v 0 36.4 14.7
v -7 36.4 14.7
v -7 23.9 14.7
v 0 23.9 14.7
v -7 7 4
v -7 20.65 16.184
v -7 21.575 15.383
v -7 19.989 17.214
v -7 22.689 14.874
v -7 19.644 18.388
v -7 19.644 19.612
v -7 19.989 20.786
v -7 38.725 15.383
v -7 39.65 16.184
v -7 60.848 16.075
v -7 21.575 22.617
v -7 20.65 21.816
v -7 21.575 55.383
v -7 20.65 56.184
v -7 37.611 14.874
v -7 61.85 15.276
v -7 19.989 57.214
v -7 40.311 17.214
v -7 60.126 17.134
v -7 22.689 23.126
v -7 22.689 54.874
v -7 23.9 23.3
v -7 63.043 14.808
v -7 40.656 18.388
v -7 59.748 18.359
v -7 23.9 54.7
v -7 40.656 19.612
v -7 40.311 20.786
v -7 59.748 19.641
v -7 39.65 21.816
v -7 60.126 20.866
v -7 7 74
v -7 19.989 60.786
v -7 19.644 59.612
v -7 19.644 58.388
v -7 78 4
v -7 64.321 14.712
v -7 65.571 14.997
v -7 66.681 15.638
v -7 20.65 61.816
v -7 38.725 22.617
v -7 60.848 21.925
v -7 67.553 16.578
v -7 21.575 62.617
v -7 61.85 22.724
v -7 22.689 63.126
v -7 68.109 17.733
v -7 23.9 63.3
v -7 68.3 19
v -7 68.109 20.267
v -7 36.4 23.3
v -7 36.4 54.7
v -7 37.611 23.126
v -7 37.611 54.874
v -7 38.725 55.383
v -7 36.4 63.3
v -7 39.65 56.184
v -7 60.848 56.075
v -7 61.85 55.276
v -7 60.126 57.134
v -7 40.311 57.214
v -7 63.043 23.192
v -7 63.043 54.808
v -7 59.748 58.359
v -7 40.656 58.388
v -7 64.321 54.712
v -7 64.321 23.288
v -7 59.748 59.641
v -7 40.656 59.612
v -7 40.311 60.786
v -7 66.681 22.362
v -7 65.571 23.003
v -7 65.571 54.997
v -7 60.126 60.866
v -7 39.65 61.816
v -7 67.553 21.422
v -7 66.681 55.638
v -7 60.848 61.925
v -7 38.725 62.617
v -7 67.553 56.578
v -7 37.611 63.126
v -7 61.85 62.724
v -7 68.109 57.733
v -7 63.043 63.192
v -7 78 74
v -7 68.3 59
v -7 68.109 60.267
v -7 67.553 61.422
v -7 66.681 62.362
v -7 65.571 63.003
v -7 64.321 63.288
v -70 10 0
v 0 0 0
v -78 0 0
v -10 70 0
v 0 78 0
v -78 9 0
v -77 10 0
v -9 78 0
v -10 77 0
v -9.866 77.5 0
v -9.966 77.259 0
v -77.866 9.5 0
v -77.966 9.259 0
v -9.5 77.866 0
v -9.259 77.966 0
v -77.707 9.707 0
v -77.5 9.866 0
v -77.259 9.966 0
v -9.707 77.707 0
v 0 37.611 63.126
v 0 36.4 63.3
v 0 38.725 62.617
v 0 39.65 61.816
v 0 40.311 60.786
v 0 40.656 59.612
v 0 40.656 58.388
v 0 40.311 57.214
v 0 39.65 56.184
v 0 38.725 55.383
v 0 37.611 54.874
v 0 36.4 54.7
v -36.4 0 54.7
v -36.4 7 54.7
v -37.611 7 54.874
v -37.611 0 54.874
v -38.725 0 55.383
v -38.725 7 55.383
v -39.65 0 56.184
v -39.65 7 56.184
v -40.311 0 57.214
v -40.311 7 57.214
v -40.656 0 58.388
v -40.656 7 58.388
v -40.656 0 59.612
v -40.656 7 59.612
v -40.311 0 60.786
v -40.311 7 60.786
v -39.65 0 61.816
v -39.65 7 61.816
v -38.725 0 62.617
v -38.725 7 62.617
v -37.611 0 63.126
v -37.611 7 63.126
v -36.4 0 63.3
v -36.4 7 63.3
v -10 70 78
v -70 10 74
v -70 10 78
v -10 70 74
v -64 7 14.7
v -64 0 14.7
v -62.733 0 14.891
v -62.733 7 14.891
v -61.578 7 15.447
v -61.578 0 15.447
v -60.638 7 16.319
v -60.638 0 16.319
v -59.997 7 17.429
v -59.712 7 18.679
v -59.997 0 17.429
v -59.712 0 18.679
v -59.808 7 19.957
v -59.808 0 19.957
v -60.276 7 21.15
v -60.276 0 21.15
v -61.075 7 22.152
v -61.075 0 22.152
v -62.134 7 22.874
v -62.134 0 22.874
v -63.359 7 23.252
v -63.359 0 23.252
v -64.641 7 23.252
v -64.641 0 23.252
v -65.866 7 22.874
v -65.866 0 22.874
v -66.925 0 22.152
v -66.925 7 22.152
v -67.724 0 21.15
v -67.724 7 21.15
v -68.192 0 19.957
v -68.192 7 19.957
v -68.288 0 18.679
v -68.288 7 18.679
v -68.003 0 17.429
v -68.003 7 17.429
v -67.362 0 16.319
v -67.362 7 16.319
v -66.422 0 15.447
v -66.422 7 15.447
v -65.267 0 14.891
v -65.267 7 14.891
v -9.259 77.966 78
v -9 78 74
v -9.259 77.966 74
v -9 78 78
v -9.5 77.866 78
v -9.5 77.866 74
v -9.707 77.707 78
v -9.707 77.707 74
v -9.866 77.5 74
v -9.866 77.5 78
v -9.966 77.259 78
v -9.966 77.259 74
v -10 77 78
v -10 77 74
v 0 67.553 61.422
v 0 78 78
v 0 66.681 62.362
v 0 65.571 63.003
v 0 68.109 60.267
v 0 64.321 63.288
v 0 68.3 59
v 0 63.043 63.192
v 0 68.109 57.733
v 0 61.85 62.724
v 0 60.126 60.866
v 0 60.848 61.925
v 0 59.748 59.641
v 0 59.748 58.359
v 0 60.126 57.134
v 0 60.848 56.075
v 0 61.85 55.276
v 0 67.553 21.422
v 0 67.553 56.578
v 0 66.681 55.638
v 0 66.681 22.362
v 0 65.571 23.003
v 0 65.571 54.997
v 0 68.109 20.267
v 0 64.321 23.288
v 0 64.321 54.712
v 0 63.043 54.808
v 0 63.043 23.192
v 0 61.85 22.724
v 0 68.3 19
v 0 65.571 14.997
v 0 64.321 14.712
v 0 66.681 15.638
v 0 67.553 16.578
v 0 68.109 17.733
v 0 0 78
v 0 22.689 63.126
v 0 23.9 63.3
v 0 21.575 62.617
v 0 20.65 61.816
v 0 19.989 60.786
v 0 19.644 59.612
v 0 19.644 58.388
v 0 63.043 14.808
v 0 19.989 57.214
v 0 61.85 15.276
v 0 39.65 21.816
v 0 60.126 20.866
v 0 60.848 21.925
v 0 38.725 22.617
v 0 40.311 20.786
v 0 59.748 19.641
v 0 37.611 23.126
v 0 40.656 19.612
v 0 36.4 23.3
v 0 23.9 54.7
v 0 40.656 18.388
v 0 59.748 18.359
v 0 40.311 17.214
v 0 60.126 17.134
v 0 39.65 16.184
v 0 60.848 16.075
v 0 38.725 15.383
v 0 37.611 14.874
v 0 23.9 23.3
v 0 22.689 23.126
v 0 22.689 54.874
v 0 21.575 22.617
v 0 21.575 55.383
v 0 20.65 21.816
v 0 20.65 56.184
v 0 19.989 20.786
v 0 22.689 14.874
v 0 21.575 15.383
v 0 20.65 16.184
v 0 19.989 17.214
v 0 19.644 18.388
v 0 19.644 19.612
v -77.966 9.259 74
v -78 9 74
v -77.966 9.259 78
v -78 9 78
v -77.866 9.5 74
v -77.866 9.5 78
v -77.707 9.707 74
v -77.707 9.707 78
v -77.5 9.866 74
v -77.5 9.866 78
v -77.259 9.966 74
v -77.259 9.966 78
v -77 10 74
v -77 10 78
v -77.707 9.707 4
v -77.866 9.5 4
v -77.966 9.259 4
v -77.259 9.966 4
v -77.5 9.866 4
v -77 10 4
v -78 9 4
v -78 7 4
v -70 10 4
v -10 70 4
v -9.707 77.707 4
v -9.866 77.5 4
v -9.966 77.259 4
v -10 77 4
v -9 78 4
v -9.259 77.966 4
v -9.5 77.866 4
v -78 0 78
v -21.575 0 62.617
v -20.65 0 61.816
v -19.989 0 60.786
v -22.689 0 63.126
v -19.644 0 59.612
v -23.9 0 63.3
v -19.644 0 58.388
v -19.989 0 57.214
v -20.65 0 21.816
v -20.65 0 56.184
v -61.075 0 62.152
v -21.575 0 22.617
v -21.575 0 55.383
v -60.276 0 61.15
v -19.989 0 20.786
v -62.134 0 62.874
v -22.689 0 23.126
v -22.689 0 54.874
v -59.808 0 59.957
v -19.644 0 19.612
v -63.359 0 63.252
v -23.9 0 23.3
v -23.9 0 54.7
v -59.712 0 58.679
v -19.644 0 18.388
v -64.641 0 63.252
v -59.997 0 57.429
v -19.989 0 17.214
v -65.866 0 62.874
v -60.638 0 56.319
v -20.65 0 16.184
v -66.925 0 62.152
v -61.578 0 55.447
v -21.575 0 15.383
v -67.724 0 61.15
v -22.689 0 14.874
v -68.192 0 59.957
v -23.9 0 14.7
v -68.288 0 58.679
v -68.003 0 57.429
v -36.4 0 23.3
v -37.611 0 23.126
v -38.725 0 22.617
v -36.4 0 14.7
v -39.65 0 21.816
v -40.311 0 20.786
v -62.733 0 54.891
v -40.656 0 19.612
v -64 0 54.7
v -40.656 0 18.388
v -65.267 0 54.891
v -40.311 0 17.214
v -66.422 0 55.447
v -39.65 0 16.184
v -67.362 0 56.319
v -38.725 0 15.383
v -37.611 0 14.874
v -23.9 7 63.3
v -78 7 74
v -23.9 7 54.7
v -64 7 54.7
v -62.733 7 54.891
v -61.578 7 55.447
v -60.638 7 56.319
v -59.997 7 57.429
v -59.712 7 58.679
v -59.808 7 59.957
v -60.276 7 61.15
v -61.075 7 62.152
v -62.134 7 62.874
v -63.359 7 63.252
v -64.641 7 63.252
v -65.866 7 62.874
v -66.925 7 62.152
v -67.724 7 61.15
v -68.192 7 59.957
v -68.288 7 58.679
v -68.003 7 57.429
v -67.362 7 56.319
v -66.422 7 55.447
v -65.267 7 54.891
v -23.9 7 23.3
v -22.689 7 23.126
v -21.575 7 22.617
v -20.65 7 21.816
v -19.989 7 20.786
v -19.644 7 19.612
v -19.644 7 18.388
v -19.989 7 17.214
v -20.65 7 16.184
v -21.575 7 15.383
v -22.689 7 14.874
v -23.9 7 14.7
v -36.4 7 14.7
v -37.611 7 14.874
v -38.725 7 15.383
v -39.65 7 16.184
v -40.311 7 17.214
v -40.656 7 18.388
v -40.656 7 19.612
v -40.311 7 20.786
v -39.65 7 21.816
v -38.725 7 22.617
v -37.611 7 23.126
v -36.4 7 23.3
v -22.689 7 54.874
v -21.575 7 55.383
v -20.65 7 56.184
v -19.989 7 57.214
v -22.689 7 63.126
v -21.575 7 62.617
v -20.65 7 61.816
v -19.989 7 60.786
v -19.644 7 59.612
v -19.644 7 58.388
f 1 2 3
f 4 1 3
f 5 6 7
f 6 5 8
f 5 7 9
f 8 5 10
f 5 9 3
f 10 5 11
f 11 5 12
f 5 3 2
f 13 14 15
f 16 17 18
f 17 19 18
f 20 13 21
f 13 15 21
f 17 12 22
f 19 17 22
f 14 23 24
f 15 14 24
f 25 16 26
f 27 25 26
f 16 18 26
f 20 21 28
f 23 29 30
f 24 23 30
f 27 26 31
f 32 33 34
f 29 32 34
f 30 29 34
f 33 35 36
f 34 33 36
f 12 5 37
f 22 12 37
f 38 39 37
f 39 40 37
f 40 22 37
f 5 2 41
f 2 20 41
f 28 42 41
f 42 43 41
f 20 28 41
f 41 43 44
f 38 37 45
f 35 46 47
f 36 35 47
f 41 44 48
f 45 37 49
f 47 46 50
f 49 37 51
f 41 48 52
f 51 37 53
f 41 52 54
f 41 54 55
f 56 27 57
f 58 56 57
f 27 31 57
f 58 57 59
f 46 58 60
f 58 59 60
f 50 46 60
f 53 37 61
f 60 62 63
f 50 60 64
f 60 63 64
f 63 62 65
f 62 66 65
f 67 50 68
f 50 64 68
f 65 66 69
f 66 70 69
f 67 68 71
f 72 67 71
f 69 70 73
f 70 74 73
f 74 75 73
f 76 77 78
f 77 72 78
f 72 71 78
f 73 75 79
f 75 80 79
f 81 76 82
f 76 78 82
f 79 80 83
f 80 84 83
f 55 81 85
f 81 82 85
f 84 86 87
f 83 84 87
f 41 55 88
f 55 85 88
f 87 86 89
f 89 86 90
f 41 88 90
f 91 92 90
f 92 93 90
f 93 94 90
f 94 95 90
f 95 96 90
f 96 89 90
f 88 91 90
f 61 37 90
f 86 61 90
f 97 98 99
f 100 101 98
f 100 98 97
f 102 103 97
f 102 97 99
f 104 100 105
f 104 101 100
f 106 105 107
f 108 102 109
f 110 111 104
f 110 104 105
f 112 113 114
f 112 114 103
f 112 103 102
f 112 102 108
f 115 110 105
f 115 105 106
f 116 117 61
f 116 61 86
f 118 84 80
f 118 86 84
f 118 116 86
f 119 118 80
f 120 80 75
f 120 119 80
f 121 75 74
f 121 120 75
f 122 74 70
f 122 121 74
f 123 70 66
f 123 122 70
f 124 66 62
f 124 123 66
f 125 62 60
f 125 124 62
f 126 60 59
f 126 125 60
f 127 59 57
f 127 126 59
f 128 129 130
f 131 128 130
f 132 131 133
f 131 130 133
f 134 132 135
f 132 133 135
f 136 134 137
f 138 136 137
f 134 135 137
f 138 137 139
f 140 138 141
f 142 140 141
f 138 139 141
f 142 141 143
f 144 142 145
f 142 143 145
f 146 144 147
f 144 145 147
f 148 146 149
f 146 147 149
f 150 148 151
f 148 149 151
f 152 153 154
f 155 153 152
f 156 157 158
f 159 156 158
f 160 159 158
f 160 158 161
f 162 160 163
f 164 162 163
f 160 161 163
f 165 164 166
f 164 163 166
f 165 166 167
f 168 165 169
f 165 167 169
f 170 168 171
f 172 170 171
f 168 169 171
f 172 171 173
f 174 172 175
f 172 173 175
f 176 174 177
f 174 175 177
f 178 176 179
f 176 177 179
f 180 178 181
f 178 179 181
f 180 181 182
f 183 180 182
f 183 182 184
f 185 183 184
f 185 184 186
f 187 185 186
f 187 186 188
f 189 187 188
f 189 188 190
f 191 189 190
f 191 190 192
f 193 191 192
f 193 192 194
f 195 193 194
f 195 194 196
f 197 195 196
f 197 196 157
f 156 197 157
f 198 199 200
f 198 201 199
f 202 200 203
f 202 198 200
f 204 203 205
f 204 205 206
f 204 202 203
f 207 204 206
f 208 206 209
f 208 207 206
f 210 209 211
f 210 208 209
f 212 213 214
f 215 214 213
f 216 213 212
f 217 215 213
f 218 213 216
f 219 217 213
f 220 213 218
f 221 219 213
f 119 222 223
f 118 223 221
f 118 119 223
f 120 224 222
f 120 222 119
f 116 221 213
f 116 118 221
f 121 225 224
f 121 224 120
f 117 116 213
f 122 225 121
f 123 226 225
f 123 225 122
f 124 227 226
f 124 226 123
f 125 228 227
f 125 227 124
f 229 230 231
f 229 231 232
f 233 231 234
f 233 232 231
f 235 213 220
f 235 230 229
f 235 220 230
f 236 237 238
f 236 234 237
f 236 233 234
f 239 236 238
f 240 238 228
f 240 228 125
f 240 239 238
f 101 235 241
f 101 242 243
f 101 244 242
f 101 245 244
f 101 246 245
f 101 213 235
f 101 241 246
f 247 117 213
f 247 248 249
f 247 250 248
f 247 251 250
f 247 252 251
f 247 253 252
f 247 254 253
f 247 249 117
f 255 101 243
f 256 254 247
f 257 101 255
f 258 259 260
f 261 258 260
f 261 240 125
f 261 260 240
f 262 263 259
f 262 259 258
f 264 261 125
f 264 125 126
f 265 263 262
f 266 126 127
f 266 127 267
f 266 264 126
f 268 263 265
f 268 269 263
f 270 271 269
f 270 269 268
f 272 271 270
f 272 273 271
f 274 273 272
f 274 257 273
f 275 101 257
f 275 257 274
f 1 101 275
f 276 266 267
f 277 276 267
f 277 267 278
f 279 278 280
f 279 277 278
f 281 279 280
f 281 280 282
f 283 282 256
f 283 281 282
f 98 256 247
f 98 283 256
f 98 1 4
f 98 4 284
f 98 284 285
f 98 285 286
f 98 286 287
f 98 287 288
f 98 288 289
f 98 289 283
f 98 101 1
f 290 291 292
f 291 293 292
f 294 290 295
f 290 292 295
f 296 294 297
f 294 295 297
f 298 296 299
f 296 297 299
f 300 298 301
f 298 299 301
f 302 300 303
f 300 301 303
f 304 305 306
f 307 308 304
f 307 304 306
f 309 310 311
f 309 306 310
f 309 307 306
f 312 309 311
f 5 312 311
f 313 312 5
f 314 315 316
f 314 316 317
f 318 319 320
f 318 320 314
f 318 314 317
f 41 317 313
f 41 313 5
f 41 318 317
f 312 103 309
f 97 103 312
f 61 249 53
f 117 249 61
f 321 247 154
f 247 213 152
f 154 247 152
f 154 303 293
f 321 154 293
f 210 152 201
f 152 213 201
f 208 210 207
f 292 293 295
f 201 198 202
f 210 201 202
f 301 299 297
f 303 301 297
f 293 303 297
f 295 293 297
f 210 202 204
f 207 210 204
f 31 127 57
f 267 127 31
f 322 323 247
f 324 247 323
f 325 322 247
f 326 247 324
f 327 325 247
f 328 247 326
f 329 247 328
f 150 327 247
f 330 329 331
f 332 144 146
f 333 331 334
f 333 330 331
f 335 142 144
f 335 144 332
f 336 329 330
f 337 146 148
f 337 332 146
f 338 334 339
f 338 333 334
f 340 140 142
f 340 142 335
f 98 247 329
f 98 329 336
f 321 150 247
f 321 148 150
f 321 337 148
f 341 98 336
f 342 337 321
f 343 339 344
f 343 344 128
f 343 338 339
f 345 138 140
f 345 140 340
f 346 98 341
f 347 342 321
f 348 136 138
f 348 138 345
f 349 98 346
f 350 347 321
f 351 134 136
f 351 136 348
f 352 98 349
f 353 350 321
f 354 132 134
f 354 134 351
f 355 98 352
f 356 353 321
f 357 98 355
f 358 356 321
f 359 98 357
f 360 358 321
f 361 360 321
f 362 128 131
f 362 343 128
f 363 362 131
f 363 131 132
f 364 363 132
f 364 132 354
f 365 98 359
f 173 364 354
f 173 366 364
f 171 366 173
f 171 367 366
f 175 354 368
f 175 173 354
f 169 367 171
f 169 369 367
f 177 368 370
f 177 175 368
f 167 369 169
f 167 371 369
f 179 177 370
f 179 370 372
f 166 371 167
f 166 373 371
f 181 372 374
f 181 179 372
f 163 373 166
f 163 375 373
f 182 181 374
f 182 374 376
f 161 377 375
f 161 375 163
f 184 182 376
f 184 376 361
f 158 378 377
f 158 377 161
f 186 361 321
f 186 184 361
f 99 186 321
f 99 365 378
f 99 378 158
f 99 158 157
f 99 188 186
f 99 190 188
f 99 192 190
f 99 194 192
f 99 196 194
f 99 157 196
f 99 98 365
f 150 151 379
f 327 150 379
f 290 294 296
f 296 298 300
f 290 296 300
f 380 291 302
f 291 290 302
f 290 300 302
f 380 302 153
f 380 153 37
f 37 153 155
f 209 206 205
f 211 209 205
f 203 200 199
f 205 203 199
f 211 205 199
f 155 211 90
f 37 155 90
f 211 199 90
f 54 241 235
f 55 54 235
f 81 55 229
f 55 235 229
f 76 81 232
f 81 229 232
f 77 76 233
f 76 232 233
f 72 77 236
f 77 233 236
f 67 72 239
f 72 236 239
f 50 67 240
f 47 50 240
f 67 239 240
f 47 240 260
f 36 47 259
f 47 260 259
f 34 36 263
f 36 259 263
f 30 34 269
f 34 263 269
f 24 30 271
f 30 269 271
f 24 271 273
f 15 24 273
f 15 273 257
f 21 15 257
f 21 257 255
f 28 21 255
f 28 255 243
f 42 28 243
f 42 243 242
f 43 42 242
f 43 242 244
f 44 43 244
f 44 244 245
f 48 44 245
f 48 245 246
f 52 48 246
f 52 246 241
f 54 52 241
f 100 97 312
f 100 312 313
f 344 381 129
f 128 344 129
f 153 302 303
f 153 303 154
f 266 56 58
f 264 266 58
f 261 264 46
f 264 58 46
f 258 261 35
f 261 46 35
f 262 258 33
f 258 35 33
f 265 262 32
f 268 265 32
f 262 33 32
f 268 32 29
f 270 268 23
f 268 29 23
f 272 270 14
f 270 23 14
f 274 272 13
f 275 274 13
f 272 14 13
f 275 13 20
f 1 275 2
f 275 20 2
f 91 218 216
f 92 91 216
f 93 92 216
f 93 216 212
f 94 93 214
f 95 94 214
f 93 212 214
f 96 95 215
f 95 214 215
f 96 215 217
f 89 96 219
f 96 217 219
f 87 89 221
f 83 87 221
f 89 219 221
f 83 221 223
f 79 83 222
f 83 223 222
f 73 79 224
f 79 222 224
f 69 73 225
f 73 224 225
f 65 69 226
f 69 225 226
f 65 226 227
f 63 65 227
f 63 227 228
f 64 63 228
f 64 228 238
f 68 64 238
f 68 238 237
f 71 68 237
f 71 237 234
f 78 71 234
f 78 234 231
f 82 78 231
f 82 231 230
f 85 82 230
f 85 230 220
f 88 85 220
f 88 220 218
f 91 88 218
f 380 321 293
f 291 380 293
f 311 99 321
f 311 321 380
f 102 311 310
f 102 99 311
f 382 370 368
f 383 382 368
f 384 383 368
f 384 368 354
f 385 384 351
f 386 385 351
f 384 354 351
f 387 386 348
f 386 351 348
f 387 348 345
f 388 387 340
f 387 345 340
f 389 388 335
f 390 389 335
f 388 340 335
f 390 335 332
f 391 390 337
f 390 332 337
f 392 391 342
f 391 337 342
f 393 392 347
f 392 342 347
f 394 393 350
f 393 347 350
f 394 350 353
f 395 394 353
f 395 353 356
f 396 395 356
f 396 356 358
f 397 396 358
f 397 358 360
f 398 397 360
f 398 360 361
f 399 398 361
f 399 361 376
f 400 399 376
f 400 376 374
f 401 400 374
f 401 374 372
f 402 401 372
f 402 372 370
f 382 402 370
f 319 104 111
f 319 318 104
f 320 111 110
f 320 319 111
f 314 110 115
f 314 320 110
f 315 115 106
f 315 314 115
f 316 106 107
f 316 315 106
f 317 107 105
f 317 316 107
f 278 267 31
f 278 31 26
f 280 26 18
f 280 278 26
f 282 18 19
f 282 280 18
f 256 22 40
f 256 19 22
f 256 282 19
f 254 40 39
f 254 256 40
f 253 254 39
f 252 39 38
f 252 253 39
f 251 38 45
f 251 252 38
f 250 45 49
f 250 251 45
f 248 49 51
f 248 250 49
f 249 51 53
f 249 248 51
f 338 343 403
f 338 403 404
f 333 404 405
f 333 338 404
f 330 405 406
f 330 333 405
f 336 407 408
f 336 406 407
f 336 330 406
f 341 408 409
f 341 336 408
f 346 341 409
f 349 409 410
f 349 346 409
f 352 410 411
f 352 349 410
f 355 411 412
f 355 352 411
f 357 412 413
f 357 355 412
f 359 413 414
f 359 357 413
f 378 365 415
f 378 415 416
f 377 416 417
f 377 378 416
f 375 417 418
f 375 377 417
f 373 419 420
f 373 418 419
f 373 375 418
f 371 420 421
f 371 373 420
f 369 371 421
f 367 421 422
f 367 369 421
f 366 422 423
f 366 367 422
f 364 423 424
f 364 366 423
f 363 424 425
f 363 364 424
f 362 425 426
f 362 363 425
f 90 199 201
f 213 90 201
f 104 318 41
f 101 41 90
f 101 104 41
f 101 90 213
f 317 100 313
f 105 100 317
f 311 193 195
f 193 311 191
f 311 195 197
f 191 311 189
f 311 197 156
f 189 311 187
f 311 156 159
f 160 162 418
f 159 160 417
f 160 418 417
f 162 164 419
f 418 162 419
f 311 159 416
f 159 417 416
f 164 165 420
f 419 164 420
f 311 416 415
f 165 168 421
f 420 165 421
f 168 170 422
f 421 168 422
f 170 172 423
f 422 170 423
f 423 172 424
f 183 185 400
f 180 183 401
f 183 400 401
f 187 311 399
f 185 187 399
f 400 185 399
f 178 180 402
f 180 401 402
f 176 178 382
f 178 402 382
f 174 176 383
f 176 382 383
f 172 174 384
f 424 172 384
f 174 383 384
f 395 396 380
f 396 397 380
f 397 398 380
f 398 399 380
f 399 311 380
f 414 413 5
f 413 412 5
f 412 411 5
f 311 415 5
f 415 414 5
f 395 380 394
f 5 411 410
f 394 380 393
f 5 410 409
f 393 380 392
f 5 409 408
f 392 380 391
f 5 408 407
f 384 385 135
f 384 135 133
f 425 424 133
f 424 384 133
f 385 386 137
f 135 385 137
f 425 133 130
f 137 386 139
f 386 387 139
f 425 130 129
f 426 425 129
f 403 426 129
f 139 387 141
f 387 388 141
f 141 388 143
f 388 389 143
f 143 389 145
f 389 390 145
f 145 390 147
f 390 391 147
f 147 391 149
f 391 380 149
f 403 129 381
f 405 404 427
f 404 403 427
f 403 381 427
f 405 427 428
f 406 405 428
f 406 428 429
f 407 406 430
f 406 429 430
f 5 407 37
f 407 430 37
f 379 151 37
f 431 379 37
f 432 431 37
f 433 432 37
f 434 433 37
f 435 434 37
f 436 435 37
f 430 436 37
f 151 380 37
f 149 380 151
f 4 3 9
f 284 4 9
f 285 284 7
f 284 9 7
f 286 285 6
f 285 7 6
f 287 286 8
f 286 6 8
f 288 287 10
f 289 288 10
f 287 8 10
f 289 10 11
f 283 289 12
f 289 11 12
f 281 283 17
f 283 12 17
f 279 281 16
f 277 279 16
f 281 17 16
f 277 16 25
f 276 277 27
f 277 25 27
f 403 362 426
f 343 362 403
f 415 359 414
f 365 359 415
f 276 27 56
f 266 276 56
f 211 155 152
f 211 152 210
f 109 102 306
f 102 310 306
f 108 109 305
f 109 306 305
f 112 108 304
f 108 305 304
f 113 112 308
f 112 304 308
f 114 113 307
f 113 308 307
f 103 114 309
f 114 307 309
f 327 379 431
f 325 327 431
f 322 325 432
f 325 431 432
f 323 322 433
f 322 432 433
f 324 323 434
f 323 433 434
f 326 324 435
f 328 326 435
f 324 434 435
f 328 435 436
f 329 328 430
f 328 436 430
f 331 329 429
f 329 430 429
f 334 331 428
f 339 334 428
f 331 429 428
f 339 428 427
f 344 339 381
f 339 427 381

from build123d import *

# Parameters (mm, degrees)
EXTRUDE_1_DEPTH     = 78
SKETCH_2_W          = 76.862745098
SKETCH_2_H          = 79.911669522
CUT_EXTRUDE_1_DEPTH = 35
FILLET_1_R          = 1
SKETCH_3_R          = 4.3
CUT_EXTRUDE_2_DEPTH = 35
SKETCH_4_R          = 4.3
CUT_EXTRUDE_3_DEPTH = 35


with BuildPart() as part:
    # 草图1 → 凸台-拉伸1 (new body)
    with BuildSketch(Plane.XY):
        Polygon((0, 0), (-78, 0), (-78, 10), (-70, 10), (-10, 70), (-10, 78), (0, 78), align=None)
    extrude(amount=EXTRUDE_1_DEPTH)

    # 草图2 → 切除-拉伸1 (cut, symmetric)
    with BuildSketch(Plane.XY.offset(39)):
        with Locations((-45.431372549, 46.955834761)):
            Rectangle(SKETCH_2_W, SKETCH_2_H)
    extrude(amount=CUT_EXTRUDE_1_DEPTH, both=True, mode=Mode.SUBTRACT)

    # 圆角1
    fillet_1_edges = [part.edges().sort_by_distance(p)[0] for p in [
        (-78, 10, 76),
        (-10, 78, 76),
        (-78, 10, 2),
        (-10, 78, 2),
    ]]
    fillet(fillet_1_edges, radius=FILLET_1_R)

    # 草图3 → 切除-拉伸2 (cut, symmetric)
    with BuildSketch(Plane(origin=(0, 0, 0), x_dir=(0, 0, -1), z_dir=(1, 0, 0))):
        with Locations(Location((-19, 64, 0), (0, 0, 90))):
            Circle(SKETCH_3_R)
        with Locations(Location((-59, 64, 0), (0, 0, 90))):
            Circle(SKETCH_3_R)
        with BuildLine():
            Line((-14.7, 36.4), (-14.7, 23.9))
            ThreePointArc((-14.7, 23.9), (-19, 19.6), (-23.3, 23.9))
            Line((-23.3, 23.9), (-23.3, 36.4))
            ThreePointArc((-23.3, 36.4), (-19, 40.7), (-14.7, 36.4))
        make_face()
        with BuildLine():
            Line((-54.7, 36.4), (-54.7, 23.9))
            ThreePointArc((-54.7, 23.9), (-59, 19.6), (-63.3, 23.9))
            Line((-63.3, 23.9), (-63.3, 36.4))
            ThreePointArc((-63.3, 36.4), (-59, 40.7), (-54.7, 36.4))
        make_face()
    extrude(amount=CUT_EXTRUDE_2_DEPTH, both=True, mode=Mode.SUBTRACT)

    # 草图4 → 切除-拉伸3 (cut, symmetric)
    with BuildSketch(Plane.XZ):
        with Locations(Location((-64, 59, 0), (0, 0, 270))):
            Circle(SKETCH_4_R)
        with Locations(Location((-64, 19, 0), (0, 0, 270))):
            Circle(SKETCH_4_R)
        with BuildLine():
            Line((-36.4, 63.3), (-23.9, 63.3))
            ThreePointArc((-23.9, 63.3), (-19.6, 59), (-23.9, 54.7))
            Line((-23.9, 54.7), (-36.4, 54.7))
            ThreePointArc((-36.4, 54.7), (-40.7, 59), (-36.4, 63.3))
        make_face()
        with BuildLine():
            Line((-36.4, 23.3), (-23.9, 23.3))
            ThreePointArc((-23.9, 23.3), (-19.6, 19), (-23.9, 14.7))
            Line((-23.9, 14.7), (-36.4, 14.7))
            ThreePointArc((-36.4, 14.7), (-40.7, 19), (-36.4, 23.3))
        make_face()
    extrude(amount=CUT_EXTRUDE_3_DEPTH, both=True, mode=Mode.SUBTRACT)


solid = part.part
